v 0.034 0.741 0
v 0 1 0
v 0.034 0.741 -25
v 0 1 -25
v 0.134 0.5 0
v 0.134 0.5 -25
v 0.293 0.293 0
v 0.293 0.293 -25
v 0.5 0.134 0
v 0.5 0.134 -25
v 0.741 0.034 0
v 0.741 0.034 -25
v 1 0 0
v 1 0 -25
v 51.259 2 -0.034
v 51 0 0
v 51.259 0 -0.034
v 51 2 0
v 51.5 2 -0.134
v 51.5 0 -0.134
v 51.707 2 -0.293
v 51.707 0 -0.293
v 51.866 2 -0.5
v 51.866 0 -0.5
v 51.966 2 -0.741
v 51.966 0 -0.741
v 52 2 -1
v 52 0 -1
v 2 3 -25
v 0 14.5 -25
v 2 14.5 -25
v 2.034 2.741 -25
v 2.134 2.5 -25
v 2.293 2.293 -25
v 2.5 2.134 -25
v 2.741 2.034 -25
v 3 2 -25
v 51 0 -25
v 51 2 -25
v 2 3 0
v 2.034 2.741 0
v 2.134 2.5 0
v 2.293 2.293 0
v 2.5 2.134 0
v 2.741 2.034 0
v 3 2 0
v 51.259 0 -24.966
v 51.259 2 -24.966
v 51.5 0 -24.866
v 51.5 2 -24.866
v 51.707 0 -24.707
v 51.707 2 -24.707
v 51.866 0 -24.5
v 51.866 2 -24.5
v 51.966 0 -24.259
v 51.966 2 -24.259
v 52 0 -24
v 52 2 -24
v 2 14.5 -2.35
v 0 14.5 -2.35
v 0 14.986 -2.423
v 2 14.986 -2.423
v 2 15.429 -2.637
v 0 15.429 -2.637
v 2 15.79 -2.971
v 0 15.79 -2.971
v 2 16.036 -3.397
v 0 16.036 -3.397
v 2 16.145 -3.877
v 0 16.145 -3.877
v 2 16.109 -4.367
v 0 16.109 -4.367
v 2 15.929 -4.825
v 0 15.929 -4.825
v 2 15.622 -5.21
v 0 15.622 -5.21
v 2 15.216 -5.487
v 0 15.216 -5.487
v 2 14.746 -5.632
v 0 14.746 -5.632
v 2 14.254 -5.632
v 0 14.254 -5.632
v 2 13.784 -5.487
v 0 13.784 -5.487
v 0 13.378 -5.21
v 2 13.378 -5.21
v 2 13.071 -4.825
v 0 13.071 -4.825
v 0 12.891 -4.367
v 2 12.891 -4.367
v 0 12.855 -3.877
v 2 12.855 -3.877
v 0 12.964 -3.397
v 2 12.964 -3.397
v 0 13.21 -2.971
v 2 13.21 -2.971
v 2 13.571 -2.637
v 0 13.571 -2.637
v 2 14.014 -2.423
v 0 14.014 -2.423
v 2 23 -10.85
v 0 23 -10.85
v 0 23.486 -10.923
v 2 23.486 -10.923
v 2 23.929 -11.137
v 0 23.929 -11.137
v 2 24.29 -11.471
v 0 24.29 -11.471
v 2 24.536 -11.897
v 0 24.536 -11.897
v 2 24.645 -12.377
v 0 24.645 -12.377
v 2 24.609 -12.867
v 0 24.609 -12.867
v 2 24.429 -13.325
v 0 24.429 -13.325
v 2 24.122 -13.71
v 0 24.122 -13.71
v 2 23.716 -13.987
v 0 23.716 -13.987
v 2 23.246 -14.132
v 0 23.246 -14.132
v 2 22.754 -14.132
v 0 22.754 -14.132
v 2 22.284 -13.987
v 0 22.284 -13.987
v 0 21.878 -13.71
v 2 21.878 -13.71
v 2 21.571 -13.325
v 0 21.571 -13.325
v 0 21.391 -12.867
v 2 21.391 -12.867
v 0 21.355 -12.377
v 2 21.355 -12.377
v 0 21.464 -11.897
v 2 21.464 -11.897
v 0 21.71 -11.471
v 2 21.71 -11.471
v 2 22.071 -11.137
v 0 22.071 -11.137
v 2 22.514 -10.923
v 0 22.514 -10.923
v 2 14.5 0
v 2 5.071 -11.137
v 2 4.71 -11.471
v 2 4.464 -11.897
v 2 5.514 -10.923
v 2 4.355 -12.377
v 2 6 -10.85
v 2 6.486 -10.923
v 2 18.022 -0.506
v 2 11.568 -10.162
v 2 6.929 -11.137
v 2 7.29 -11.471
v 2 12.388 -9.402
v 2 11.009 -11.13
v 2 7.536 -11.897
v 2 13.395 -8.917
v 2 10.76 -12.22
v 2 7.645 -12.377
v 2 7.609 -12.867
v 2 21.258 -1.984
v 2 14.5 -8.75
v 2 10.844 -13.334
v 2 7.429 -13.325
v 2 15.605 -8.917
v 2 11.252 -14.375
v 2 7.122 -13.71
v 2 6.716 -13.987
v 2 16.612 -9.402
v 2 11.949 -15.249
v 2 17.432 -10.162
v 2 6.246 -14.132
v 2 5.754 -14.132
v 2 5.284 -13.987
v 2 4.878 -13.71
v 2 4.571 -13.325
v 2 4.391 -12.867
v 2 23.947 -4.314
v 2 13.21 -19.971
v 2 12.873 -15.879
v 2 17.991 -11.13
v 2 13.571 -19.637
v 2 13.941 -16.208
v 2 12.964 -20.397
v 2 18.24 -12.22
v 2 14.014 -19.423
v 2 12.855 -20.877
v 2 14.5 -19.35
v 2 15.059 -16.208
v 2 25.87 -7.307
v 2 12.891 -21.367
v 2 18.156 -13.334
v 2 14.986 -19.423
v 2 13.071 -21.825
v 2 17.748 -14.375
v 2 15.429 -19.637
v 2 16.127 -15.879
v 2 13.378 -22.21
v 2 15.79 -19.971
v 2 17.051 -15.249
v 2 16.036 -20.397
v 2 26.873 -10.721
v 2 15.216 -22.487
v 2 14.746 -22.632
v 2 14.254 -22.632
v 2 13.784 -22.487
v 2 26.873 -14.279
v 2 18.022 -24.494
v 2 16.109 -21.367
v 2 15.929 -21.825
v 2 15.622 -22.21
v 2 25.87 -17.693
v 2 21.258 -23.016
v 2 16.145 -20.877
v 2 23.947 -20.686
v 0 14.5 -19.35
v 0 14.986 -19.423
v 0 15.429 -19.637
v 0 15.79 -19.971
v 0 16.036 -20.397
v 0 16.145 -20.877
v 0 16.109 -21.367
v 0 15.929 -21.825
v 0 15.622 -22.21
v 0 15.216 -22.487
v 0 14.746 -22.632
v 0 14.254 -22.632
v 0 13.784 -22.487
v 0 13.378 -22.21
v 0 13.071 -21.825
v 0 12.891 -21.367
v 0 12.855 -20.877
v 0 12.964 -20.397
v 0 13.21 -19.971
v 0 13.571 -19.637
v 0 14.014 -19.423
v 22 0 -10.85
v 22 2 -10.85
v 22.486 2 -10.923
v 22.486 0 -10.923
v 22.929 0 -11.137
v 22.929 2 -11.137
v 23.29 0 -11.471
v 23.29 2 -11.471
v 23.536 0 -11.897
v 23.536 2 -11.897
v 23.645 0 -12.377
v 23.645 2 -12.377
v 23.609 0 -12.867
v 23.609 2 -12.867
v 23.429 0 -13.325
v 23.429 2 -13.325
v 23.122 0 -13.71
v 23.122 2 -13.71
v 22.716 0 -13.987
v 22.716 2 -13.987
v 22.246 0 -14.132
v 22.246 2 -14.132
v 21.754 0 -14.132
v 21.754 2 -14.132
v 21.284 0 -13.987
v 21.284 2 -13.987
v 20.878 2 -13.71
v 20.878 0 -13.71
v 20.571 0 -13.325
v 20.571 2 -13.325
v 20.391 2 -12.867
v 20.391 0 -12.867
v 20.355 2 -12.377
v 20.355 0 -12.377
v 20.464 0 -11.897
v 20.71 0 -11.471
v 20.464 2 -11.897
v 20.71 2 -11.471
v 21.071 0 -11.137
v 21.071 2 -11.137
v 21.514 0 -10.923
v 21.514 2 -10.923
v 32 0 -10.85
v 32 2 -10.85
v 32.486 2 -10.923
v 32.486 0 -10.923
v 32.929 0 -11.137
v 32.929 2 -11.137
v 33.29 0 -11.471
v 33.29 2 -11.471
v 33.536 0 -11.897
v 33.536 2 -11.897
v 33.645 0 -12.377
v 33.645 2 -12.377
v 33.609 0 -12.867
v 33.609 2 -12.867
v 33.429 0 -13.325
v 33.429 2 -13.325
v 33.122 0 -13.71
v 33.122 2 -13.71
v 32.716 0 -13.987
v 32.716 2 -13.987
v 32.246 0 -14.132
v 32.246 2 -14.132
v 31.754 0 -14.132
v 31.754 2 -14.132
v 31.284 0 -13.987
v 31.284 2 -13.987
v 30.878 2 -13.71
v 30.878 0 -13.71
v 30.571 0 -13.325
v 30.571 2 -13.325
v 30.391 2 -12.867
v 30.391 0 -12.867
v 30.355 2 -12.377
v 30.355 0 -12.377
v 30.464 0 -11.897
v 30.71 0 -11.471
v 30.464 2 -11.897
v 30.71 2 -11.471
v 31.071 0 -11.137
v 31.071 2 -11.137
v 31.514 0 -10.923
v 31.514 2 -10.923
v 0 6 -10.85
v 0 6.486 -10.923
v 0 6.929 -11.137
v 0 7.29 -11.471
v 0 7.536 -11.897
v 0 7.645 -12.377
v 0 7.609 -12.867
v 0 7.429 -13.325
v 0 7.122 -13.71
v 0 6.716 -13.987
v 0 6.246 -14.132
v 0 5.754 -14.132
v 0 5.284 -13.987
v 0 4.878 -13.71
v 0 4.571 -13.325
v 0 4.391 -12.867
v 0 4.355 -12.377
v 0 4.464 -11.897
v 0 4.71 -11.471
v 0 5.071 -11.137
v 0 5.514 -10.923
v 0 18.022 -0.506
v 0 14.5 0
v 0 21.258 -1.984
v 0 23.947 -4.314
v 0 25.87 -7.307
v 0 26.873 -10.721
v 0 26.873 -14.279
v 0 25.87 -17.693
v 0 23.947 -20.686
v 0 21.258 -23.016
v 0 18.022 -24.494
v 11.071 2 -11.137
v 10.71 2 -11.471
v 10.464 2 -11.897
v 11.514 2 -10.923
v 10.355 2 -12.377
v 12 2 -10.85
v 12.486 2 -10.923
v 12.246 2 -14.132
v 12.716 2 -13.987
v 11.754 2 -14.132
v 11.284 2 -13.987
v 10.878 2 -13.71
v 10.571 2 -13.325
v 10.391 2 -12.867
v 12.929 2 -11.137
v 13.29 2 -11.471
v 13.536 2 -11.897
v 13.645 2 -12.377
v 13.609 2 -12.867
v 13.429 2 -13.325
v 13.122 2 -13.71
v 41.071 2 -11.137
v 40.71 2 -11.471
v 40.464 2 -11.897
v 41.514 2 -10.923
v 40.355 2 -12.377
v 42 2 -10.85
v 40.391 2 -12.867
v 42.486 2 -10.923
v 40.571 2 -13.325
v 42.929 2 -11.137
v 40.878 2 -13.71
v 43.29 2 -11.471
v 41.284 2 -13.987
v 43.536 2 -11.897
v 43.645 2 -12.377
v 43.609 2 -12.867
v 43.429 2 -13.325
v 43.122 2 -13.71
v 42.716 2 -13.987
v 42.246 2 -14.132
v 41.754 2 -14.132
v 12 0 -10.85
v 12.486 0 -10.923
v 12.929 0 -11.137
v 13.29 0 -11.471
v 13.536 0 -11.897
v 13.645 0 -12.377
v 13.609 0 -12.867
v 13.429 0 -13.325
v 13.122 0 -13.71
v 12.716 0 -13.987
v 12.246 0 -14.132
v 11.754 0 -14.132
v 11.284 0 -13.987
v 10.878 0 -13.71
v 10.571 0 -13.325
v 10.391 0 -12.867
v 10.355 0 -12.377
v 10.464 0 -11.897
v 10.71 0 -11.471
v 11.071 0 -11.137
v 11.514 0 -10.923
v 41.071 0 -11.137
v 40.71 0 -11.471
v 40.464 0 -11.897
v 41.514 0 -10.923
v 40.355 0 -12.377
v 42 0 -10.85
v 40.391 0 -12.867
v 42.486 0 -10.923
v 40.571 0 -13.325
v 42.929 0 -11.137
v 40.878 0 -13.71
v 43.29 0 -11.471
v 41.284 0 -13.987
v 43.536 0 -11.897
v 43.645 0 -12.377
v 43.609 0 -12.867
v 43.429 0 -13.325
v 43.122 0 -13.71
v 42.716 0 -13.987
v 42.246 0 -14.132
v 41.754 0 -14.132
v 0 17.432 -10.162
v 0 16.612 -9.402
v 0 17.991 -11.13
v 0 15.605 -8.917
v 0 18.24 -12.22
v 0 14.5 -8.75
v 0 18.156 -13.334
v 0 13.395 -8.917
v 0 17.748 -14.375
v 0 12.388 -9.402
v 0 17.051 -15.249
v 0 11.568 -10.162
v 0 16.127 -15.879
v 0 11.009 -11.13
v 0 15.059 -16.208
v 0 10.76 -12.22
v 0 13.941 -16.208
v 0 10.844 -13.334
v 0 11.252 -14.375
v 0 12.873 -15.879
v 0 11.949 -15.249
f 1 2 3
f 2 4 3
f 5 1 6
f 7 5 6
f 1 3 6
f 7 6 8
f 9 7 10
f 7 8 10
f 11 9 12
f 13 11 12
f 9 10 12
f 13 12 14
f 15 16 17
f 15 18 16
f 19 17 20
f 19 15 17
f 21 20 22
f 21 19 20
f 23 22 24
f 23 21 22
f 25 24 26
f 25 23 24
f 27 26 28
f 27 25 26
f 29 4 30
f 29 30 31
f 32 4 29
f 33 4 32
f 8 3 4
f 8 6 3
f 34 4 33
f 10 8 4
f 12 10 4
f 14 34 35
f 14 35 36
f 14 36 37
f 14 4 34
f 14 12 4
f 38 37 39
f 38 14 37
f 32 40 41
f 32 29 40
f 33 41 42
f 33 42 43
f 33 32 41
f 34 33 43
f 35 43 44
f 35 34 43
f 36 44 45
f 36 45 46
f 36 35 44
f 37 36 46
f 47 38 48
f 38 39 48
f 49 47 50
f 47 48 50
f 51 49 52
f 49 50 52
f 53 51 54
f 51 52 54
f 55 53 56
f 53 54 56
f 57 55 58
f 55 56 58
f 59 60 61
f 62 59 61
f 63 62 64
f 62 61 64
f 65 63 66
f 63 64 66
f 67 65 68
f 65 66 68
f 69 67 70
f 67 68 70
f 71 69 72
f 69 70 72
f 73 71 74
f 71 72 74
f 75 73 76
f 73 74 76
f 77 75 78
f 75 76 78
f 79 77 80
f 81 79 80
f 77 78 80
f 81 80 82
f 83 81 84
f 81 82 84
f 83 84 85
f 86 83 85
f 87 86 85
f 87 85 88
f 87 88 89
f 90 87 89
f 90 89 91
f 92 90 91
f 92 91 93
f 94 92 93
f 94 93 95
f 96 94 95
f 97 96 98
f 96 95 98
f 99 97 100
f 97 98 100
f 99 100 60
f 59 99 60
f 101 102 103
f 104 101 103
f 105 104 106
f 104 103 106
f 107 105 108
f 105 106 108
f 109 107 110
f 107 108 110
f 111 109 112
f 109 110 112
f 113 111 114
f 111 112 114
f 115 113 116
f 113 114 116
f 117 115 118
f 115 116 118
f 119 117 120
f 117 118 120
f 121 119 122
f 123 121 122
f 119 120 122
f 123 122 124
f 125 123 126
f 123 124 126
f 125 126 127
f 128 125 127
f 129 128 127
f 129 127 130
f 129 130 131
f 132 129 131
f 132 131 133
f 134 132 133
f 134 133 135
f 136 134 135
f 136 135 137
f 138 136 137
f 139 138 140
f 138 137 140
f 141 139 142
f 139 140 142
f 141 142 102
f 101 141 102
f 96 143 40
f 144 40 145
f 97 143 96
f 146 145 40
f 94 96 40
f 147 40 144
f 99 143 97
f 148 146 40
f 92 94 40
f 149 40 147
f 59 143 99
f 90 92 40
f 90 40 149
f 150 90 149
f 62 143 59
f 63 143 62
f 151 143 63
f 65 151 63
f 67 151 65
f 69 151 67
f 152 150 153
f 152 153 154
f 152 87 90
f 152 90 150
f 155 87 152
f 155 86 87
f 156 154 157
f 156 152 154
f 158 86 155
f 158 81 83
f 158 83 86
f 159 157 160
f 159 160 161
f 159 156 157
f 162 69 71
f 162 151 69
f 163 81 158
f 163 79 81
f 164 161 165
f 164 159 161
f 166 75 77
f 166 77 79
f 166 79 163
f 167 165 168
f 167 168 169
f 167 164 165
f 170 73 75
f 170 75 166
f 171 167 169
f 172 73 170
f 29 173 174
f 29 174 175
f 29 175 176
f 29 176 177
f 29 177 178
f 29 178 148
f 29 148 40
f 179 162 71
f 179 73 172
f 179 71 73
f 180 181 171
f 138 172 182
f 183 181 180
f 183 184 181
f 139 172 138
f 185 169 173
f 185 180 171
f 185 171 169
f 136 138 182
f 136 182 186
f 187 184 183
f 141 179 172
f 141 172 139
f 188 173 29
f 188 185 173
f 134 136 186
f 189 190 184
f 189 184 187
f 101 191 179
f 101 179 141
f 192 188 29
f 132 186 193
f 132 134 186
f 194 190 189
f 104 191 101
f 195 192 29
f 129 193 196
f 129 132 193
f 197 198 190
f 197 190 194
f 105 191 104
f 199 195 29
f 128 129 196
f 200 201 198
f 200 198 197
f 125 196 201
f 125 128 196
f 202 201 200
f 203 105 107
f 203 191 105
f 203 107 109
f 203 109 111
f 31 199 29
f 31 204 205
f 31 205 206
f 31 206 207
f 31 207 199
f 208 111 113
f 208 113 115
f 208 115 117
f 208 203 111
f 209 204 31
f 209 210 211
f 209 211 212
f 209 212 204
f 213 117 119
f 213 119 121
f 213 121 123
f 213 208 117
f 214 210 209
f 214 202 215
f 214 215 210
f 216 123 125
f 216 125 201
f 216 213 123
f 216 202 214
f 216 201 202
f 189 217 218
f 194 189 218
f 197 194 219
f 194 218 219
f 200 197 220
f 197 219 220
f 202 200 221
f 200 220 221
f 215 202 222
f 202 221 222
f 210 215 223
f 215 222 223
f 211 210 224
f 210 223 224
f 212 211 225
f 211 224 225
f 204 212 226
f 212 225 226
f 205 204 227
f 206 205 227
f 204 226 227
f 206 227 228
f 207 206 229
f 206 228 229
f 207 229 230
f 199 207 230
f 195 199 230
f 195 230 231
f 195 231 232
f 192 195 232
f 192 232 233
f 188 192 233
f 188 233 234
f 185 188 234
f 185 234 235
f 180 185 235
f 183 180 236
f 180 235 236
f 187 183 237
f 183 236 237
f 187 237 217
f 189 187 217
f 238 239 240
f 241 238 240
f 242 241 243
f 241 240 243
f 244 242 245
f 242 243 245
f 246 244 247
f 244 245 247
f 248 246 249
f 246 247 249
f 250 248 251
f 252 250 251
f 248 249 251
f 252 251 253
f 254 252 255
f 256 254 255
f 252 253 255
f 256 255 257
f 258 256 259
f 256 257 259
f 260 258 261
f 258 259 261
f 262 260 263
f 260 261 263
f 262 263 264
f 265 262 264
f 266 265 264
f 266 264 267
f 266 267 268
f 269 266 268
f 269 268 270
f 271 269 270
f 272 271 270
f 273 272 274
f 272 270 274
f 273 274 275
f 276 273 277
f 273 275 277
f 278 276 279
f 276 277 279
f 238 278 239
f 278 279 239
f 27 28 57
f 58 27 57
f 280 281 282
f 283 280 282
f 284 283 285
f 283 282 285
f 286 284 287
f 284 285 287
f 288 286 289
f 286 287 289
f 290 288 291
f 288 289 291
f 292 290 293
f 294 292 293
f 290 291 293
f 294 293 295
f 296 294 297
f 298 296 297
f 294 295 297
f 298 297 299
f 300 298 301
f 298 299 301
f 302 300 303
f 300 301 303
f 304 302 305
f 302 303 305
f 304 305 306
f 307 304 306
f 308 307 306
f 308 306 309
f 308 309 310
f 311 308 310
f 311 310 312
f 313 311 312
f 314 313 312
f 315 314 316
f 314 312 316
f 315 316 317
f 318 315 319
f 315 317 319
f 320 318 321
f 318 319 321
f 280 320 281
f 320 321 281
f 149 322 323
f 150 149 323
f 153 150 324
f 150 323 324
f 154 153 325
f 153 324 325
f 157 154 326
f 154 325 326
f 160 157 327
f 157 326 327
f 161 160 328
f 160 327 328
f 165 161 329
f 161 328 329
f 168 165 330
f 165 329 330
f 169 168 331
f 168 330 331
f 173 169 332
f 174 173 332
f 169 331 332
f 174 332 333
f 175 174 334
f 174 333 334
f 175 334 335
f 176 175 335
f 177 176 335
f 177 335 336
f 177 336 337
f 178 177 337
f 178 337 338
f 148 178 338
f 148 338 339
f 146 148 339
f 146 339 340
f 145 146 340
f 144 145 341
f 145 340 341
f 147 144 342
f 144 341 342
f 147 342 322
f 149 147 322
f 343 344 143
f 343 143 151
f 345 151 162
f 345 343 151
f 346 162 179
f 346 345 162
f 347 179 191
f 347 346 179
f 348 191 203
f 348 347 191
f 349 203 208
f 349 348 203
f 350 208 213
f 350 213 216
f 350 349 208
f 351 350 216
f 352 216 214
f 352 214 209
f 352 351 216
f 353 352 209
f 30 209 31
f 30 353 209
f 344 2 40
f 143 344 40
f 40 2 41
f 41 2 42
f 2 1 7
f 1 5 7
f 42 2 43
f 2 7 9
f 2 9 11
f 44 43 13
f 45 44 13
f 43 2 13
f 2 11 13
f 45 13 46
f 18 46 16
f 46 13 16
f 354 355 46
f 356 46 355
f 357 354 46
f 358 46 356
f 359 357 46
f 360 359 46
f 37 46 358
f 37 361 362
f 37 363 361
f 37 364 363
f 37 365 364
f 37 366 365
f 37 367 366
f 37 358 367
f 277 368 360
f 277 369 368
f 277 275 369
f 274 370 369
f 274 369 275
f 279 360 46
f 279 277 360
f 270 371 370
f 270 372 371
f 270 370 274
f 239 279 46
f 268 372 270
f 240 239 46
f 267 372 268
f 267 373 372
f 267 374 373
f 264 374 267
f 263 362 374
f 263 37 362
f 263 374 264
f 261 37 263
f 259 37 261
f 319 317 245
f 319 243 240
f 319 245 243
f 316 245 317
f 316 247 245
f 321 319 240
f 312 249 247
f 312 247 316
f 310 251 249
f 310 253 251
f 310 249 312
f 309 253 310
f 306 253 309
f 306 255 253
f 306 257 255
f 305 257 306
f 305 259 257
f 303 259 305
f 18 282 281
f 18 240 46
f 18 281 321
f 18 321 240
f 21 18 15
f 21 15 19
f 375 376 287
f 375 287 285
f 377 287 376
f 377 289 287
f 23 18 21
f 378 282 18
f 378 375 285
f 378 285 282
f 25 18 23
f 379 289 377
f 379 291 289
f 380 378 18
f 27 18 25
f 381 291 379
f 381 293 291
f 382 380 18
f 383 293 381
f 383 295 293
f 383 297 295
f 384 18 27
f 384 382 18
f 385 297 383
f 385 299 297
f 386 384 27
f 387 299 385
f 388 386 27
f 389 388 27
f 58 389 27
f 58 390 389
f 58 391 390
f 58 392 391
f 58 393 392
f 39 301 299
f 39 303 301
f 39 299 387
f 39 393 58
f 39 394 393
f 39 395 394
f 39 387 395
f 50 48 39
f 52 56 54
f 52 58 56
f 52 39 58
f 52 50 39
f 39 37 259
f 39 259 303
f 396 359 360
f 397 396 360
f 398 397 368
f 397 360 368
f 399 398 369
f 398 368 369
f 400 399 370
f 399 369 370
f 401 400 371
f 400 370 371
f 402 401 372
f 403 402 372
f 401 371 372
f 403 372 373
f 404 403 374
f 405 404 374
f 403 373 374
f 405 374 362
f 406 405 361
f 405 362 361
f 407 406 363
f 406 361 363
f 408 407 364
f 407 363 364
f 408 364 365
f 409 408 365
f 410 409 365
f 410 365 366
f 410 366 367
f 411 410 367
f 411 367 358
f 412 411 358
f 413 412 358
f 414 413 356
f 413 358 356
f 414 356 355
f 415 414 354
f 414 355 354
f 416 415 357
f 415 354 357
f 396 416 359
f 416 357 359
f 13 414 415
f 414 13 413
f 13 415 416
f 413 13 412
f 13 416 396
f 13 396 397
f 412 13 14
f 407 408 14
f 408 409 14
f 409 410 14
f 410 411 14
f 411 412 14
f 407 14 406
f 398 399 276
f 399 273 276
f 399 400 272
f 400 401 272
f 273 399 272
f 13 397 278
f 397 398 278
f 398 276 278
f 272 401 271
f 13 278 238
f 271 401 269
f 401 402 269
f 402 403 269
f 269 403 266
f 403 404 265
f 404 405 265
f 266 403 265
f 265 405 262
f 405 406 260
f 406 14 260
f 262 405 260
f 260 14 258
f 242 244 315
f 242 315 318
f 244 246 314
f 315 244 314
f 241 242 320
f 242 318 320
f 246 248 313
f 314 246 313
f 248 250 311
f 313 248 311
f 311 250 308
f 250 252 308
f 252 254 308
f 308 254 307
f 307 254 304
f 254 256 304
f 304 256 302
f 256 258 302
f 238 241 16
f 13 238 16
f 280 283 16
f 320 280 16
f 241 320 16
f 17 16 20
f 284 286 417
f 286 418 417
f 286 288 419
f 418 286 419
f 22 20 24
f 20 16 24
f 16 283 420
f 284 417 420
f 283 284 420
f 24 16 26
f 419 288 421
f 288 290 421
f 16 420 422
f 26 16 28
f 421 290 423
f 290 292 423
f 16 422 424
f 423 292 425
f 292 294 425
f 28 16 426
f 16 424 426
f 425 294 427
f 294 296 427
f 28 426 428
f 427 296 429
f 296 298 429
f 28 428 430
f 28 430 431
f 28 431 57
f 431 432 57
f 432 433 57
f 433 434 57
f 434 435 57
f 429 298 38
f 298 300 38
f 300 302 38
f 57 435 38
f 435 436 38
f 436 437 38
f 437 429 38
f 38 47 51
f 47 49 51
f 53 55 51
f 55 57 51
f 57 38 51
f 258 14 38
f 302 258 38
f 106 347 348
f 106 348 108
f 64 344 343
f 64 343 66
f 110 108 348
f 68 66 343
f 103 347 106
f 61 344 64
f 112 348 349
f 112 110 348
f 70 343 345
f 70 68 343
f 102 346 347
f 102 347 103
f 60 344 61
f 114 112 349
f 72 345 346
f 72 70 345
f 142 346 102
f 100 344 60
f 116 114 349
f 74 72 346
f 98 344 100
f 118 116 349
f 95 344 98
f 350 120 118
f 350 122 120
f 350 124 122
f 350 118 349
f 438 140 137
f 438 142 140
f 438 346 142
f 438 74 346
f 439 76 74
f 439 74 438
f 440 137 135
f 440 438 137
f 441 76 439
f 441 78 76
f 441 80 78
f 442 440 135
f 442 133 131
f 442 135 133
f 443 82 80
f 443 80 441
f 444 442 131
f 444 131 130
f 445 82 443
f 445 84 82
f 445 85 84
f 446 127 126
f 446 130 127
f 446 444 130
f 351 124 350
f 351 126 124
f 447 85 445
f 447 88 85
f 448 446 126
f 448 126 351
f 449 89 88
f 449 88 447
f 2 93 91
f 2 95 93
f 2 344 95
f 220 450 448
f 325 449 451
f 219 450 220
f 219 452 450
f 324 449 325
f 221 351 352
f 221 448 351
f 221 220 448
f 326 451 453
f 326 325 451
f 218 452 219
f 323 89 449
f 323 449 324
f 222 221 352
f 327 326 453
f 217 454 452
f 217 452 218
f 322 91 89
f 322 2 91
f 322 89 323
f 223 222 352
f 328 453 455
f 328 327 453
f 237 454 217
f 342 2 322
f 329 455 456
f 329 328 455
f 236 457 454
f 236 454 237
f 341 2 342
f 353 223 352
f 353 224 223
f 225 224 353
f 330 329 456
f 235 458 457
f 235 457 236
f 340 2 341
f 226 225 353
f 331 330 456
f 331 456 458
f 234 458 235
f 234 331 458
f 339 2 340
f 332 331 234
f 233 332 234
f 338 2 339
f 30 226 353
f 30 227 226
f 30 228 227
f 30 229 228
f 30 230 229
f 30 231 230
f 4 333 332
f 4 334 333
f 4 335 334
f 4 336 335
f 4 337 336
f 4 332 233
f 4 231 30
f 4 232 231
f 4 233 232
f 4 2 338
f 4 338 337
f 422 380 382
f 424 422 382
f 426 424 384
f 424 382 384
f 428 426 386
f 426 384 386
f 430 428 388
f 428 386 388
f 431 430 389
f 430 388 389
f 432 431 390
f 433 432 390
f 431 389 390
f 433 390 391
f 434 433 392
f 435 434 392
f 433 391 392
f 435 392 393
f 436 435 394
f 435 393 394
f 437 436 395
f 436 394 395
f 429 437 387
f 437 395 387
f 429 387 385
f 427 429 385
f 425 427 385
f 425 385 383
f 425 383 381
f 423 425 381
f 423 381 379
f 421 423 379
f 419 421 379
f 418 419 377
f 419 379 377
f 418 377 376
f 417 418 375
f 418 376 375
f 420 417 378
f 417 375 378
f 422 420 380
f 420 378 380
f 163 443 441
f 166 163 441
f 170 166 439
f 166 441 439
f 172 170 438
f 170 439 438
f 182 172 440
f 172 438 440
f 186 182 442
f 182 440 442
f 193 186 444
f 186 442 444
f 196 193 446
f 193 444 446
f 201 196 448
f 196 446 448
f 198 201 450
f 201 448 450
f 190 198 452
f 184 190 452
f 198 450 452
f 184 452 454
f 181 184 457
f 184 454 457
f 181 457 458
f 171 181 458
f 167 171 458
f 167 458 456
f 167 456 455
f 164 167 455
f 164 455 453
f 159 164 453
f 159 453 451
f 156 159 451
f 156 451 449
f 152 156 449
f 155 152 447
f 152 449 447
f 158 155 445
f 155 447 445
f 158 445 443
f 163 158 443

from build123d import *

# Parameters (mm, degrees)
SKETCH3_W           = 52
SKETCH3_H           = 25
BOSS_EXTRUDE3_DEPTH = 2
SKETCH4_W           = 25
SKETCH4_H           = 14.5
BOSS_EXTRUDE4_DEPTH = 2
BOSS_EXTRUDE5_DEPTH = 2
SKETCH6_R           = 1.65
CUT_EXTRUDE1_DEPTH  = 2
SKETCH7_R           = 3.75
SKETCH7_R_2         = 1.65
CUT_EXTRUDE2_DEPTH  = 2
FILLET1_R           = 1


with BuildPart() as part:
    # Sketch3 → Boss-Extrude3 (new body)
    with BuildSketch(Plane(origin=(0, 0, 0), x_dir=(1, 0, 0), z_dir=(0, 1, 0))):
        with Locations((26, 12.5)):
            Rectangle(SKETCH3_W, SKETCH3_H)
    extrude(amount=BOSS_EXTRUDE3_DEPTH)

    # Sketch4 → Boss-Extrude4 (add)
    with BuildSketch(Plane(origin=(0, 0, 0), x_dir=(0, 0, -1), z_dir=(1, 0, 0))):
        with Locations((12.5, 7.25)):
            Rectangle(SKETCH4_W, SKETCH4_H)
    extrude(amount=BOSS_EXTRUDE4_DEPTH)

    # Sketch5 → Boss-Extrude5 (add)
    with BuildSketch(Plane.ZY):
        with BuildLine():
            Line((-25, 0), (0, 0))
            Line((0, 0), (0, 14.5))
            ThreePointArc((0, 14.5), (-12.5, 27), (-25, 14.5))
            Line((-25, 14.5), (-25, 0))
        make_face()
    extrude(amount=-BOSS_EXTRUDE5_DEPTH)

    # Sketch6 → Cut-Extrude1 (cut)
    with BuildSketch(Plane(origin=(0, 2, 0), x_dir=(1, 0, 0), z_dir=(0, 1, 0))):
        with Locations(Location((12, 12.5, 0), (0, 0, 270))):
            Circle(SKETCH6_R)
        with Locations(Location((22, 12.5, 0), (0, 0, 270))):
            Circle(SKETCH6_R)
        with Locations(Location((32, 12.5, 0), (0, 0, 270))):
            Circle(SKETCH6_R)
        with Locations(Location((42, 12.5, 0), (0, 0, 270))):
            Circle(SKETCH6_R)
    extrude(amount=-CUT_EXTRUDE1_DEPTH, mode=Mode.SUBTRACT)

    # Sketch7 → Cut-Extrude2 (cut)
    with BuildSketch(Plane.ZY):
        with Locations((-12.5, 14.5)):
            Circle(SKETCH7_R)
        with Locations((-21, 14.5)):
            Circle(SKETCH7_R_2)
        with Locations((-4, 14.5)):
            Circle(SKETCH7_R_2)
        with Locations((-12.5, 6)):
            Circle(SKETCH7_R_2)
        with Locations((-12.5, 23)):
            Circle(SKETCH7_R_2)
    extrude(amount=-CUT_EXTRUDE2_DEPTH, mode=Mode.SUBTRACT)

    # Fillet1
    fillet1_edges = [part.edges().sort_by_distance(p)[0] for p in [
        (2, 2, -12.5),
        (0, 0, -12.5),
        (52, 1, -25),
        (52, 1, 0),
    ]]
    fillet(fillet1_edges, radius=FILLET1_R)


solid = part.part
